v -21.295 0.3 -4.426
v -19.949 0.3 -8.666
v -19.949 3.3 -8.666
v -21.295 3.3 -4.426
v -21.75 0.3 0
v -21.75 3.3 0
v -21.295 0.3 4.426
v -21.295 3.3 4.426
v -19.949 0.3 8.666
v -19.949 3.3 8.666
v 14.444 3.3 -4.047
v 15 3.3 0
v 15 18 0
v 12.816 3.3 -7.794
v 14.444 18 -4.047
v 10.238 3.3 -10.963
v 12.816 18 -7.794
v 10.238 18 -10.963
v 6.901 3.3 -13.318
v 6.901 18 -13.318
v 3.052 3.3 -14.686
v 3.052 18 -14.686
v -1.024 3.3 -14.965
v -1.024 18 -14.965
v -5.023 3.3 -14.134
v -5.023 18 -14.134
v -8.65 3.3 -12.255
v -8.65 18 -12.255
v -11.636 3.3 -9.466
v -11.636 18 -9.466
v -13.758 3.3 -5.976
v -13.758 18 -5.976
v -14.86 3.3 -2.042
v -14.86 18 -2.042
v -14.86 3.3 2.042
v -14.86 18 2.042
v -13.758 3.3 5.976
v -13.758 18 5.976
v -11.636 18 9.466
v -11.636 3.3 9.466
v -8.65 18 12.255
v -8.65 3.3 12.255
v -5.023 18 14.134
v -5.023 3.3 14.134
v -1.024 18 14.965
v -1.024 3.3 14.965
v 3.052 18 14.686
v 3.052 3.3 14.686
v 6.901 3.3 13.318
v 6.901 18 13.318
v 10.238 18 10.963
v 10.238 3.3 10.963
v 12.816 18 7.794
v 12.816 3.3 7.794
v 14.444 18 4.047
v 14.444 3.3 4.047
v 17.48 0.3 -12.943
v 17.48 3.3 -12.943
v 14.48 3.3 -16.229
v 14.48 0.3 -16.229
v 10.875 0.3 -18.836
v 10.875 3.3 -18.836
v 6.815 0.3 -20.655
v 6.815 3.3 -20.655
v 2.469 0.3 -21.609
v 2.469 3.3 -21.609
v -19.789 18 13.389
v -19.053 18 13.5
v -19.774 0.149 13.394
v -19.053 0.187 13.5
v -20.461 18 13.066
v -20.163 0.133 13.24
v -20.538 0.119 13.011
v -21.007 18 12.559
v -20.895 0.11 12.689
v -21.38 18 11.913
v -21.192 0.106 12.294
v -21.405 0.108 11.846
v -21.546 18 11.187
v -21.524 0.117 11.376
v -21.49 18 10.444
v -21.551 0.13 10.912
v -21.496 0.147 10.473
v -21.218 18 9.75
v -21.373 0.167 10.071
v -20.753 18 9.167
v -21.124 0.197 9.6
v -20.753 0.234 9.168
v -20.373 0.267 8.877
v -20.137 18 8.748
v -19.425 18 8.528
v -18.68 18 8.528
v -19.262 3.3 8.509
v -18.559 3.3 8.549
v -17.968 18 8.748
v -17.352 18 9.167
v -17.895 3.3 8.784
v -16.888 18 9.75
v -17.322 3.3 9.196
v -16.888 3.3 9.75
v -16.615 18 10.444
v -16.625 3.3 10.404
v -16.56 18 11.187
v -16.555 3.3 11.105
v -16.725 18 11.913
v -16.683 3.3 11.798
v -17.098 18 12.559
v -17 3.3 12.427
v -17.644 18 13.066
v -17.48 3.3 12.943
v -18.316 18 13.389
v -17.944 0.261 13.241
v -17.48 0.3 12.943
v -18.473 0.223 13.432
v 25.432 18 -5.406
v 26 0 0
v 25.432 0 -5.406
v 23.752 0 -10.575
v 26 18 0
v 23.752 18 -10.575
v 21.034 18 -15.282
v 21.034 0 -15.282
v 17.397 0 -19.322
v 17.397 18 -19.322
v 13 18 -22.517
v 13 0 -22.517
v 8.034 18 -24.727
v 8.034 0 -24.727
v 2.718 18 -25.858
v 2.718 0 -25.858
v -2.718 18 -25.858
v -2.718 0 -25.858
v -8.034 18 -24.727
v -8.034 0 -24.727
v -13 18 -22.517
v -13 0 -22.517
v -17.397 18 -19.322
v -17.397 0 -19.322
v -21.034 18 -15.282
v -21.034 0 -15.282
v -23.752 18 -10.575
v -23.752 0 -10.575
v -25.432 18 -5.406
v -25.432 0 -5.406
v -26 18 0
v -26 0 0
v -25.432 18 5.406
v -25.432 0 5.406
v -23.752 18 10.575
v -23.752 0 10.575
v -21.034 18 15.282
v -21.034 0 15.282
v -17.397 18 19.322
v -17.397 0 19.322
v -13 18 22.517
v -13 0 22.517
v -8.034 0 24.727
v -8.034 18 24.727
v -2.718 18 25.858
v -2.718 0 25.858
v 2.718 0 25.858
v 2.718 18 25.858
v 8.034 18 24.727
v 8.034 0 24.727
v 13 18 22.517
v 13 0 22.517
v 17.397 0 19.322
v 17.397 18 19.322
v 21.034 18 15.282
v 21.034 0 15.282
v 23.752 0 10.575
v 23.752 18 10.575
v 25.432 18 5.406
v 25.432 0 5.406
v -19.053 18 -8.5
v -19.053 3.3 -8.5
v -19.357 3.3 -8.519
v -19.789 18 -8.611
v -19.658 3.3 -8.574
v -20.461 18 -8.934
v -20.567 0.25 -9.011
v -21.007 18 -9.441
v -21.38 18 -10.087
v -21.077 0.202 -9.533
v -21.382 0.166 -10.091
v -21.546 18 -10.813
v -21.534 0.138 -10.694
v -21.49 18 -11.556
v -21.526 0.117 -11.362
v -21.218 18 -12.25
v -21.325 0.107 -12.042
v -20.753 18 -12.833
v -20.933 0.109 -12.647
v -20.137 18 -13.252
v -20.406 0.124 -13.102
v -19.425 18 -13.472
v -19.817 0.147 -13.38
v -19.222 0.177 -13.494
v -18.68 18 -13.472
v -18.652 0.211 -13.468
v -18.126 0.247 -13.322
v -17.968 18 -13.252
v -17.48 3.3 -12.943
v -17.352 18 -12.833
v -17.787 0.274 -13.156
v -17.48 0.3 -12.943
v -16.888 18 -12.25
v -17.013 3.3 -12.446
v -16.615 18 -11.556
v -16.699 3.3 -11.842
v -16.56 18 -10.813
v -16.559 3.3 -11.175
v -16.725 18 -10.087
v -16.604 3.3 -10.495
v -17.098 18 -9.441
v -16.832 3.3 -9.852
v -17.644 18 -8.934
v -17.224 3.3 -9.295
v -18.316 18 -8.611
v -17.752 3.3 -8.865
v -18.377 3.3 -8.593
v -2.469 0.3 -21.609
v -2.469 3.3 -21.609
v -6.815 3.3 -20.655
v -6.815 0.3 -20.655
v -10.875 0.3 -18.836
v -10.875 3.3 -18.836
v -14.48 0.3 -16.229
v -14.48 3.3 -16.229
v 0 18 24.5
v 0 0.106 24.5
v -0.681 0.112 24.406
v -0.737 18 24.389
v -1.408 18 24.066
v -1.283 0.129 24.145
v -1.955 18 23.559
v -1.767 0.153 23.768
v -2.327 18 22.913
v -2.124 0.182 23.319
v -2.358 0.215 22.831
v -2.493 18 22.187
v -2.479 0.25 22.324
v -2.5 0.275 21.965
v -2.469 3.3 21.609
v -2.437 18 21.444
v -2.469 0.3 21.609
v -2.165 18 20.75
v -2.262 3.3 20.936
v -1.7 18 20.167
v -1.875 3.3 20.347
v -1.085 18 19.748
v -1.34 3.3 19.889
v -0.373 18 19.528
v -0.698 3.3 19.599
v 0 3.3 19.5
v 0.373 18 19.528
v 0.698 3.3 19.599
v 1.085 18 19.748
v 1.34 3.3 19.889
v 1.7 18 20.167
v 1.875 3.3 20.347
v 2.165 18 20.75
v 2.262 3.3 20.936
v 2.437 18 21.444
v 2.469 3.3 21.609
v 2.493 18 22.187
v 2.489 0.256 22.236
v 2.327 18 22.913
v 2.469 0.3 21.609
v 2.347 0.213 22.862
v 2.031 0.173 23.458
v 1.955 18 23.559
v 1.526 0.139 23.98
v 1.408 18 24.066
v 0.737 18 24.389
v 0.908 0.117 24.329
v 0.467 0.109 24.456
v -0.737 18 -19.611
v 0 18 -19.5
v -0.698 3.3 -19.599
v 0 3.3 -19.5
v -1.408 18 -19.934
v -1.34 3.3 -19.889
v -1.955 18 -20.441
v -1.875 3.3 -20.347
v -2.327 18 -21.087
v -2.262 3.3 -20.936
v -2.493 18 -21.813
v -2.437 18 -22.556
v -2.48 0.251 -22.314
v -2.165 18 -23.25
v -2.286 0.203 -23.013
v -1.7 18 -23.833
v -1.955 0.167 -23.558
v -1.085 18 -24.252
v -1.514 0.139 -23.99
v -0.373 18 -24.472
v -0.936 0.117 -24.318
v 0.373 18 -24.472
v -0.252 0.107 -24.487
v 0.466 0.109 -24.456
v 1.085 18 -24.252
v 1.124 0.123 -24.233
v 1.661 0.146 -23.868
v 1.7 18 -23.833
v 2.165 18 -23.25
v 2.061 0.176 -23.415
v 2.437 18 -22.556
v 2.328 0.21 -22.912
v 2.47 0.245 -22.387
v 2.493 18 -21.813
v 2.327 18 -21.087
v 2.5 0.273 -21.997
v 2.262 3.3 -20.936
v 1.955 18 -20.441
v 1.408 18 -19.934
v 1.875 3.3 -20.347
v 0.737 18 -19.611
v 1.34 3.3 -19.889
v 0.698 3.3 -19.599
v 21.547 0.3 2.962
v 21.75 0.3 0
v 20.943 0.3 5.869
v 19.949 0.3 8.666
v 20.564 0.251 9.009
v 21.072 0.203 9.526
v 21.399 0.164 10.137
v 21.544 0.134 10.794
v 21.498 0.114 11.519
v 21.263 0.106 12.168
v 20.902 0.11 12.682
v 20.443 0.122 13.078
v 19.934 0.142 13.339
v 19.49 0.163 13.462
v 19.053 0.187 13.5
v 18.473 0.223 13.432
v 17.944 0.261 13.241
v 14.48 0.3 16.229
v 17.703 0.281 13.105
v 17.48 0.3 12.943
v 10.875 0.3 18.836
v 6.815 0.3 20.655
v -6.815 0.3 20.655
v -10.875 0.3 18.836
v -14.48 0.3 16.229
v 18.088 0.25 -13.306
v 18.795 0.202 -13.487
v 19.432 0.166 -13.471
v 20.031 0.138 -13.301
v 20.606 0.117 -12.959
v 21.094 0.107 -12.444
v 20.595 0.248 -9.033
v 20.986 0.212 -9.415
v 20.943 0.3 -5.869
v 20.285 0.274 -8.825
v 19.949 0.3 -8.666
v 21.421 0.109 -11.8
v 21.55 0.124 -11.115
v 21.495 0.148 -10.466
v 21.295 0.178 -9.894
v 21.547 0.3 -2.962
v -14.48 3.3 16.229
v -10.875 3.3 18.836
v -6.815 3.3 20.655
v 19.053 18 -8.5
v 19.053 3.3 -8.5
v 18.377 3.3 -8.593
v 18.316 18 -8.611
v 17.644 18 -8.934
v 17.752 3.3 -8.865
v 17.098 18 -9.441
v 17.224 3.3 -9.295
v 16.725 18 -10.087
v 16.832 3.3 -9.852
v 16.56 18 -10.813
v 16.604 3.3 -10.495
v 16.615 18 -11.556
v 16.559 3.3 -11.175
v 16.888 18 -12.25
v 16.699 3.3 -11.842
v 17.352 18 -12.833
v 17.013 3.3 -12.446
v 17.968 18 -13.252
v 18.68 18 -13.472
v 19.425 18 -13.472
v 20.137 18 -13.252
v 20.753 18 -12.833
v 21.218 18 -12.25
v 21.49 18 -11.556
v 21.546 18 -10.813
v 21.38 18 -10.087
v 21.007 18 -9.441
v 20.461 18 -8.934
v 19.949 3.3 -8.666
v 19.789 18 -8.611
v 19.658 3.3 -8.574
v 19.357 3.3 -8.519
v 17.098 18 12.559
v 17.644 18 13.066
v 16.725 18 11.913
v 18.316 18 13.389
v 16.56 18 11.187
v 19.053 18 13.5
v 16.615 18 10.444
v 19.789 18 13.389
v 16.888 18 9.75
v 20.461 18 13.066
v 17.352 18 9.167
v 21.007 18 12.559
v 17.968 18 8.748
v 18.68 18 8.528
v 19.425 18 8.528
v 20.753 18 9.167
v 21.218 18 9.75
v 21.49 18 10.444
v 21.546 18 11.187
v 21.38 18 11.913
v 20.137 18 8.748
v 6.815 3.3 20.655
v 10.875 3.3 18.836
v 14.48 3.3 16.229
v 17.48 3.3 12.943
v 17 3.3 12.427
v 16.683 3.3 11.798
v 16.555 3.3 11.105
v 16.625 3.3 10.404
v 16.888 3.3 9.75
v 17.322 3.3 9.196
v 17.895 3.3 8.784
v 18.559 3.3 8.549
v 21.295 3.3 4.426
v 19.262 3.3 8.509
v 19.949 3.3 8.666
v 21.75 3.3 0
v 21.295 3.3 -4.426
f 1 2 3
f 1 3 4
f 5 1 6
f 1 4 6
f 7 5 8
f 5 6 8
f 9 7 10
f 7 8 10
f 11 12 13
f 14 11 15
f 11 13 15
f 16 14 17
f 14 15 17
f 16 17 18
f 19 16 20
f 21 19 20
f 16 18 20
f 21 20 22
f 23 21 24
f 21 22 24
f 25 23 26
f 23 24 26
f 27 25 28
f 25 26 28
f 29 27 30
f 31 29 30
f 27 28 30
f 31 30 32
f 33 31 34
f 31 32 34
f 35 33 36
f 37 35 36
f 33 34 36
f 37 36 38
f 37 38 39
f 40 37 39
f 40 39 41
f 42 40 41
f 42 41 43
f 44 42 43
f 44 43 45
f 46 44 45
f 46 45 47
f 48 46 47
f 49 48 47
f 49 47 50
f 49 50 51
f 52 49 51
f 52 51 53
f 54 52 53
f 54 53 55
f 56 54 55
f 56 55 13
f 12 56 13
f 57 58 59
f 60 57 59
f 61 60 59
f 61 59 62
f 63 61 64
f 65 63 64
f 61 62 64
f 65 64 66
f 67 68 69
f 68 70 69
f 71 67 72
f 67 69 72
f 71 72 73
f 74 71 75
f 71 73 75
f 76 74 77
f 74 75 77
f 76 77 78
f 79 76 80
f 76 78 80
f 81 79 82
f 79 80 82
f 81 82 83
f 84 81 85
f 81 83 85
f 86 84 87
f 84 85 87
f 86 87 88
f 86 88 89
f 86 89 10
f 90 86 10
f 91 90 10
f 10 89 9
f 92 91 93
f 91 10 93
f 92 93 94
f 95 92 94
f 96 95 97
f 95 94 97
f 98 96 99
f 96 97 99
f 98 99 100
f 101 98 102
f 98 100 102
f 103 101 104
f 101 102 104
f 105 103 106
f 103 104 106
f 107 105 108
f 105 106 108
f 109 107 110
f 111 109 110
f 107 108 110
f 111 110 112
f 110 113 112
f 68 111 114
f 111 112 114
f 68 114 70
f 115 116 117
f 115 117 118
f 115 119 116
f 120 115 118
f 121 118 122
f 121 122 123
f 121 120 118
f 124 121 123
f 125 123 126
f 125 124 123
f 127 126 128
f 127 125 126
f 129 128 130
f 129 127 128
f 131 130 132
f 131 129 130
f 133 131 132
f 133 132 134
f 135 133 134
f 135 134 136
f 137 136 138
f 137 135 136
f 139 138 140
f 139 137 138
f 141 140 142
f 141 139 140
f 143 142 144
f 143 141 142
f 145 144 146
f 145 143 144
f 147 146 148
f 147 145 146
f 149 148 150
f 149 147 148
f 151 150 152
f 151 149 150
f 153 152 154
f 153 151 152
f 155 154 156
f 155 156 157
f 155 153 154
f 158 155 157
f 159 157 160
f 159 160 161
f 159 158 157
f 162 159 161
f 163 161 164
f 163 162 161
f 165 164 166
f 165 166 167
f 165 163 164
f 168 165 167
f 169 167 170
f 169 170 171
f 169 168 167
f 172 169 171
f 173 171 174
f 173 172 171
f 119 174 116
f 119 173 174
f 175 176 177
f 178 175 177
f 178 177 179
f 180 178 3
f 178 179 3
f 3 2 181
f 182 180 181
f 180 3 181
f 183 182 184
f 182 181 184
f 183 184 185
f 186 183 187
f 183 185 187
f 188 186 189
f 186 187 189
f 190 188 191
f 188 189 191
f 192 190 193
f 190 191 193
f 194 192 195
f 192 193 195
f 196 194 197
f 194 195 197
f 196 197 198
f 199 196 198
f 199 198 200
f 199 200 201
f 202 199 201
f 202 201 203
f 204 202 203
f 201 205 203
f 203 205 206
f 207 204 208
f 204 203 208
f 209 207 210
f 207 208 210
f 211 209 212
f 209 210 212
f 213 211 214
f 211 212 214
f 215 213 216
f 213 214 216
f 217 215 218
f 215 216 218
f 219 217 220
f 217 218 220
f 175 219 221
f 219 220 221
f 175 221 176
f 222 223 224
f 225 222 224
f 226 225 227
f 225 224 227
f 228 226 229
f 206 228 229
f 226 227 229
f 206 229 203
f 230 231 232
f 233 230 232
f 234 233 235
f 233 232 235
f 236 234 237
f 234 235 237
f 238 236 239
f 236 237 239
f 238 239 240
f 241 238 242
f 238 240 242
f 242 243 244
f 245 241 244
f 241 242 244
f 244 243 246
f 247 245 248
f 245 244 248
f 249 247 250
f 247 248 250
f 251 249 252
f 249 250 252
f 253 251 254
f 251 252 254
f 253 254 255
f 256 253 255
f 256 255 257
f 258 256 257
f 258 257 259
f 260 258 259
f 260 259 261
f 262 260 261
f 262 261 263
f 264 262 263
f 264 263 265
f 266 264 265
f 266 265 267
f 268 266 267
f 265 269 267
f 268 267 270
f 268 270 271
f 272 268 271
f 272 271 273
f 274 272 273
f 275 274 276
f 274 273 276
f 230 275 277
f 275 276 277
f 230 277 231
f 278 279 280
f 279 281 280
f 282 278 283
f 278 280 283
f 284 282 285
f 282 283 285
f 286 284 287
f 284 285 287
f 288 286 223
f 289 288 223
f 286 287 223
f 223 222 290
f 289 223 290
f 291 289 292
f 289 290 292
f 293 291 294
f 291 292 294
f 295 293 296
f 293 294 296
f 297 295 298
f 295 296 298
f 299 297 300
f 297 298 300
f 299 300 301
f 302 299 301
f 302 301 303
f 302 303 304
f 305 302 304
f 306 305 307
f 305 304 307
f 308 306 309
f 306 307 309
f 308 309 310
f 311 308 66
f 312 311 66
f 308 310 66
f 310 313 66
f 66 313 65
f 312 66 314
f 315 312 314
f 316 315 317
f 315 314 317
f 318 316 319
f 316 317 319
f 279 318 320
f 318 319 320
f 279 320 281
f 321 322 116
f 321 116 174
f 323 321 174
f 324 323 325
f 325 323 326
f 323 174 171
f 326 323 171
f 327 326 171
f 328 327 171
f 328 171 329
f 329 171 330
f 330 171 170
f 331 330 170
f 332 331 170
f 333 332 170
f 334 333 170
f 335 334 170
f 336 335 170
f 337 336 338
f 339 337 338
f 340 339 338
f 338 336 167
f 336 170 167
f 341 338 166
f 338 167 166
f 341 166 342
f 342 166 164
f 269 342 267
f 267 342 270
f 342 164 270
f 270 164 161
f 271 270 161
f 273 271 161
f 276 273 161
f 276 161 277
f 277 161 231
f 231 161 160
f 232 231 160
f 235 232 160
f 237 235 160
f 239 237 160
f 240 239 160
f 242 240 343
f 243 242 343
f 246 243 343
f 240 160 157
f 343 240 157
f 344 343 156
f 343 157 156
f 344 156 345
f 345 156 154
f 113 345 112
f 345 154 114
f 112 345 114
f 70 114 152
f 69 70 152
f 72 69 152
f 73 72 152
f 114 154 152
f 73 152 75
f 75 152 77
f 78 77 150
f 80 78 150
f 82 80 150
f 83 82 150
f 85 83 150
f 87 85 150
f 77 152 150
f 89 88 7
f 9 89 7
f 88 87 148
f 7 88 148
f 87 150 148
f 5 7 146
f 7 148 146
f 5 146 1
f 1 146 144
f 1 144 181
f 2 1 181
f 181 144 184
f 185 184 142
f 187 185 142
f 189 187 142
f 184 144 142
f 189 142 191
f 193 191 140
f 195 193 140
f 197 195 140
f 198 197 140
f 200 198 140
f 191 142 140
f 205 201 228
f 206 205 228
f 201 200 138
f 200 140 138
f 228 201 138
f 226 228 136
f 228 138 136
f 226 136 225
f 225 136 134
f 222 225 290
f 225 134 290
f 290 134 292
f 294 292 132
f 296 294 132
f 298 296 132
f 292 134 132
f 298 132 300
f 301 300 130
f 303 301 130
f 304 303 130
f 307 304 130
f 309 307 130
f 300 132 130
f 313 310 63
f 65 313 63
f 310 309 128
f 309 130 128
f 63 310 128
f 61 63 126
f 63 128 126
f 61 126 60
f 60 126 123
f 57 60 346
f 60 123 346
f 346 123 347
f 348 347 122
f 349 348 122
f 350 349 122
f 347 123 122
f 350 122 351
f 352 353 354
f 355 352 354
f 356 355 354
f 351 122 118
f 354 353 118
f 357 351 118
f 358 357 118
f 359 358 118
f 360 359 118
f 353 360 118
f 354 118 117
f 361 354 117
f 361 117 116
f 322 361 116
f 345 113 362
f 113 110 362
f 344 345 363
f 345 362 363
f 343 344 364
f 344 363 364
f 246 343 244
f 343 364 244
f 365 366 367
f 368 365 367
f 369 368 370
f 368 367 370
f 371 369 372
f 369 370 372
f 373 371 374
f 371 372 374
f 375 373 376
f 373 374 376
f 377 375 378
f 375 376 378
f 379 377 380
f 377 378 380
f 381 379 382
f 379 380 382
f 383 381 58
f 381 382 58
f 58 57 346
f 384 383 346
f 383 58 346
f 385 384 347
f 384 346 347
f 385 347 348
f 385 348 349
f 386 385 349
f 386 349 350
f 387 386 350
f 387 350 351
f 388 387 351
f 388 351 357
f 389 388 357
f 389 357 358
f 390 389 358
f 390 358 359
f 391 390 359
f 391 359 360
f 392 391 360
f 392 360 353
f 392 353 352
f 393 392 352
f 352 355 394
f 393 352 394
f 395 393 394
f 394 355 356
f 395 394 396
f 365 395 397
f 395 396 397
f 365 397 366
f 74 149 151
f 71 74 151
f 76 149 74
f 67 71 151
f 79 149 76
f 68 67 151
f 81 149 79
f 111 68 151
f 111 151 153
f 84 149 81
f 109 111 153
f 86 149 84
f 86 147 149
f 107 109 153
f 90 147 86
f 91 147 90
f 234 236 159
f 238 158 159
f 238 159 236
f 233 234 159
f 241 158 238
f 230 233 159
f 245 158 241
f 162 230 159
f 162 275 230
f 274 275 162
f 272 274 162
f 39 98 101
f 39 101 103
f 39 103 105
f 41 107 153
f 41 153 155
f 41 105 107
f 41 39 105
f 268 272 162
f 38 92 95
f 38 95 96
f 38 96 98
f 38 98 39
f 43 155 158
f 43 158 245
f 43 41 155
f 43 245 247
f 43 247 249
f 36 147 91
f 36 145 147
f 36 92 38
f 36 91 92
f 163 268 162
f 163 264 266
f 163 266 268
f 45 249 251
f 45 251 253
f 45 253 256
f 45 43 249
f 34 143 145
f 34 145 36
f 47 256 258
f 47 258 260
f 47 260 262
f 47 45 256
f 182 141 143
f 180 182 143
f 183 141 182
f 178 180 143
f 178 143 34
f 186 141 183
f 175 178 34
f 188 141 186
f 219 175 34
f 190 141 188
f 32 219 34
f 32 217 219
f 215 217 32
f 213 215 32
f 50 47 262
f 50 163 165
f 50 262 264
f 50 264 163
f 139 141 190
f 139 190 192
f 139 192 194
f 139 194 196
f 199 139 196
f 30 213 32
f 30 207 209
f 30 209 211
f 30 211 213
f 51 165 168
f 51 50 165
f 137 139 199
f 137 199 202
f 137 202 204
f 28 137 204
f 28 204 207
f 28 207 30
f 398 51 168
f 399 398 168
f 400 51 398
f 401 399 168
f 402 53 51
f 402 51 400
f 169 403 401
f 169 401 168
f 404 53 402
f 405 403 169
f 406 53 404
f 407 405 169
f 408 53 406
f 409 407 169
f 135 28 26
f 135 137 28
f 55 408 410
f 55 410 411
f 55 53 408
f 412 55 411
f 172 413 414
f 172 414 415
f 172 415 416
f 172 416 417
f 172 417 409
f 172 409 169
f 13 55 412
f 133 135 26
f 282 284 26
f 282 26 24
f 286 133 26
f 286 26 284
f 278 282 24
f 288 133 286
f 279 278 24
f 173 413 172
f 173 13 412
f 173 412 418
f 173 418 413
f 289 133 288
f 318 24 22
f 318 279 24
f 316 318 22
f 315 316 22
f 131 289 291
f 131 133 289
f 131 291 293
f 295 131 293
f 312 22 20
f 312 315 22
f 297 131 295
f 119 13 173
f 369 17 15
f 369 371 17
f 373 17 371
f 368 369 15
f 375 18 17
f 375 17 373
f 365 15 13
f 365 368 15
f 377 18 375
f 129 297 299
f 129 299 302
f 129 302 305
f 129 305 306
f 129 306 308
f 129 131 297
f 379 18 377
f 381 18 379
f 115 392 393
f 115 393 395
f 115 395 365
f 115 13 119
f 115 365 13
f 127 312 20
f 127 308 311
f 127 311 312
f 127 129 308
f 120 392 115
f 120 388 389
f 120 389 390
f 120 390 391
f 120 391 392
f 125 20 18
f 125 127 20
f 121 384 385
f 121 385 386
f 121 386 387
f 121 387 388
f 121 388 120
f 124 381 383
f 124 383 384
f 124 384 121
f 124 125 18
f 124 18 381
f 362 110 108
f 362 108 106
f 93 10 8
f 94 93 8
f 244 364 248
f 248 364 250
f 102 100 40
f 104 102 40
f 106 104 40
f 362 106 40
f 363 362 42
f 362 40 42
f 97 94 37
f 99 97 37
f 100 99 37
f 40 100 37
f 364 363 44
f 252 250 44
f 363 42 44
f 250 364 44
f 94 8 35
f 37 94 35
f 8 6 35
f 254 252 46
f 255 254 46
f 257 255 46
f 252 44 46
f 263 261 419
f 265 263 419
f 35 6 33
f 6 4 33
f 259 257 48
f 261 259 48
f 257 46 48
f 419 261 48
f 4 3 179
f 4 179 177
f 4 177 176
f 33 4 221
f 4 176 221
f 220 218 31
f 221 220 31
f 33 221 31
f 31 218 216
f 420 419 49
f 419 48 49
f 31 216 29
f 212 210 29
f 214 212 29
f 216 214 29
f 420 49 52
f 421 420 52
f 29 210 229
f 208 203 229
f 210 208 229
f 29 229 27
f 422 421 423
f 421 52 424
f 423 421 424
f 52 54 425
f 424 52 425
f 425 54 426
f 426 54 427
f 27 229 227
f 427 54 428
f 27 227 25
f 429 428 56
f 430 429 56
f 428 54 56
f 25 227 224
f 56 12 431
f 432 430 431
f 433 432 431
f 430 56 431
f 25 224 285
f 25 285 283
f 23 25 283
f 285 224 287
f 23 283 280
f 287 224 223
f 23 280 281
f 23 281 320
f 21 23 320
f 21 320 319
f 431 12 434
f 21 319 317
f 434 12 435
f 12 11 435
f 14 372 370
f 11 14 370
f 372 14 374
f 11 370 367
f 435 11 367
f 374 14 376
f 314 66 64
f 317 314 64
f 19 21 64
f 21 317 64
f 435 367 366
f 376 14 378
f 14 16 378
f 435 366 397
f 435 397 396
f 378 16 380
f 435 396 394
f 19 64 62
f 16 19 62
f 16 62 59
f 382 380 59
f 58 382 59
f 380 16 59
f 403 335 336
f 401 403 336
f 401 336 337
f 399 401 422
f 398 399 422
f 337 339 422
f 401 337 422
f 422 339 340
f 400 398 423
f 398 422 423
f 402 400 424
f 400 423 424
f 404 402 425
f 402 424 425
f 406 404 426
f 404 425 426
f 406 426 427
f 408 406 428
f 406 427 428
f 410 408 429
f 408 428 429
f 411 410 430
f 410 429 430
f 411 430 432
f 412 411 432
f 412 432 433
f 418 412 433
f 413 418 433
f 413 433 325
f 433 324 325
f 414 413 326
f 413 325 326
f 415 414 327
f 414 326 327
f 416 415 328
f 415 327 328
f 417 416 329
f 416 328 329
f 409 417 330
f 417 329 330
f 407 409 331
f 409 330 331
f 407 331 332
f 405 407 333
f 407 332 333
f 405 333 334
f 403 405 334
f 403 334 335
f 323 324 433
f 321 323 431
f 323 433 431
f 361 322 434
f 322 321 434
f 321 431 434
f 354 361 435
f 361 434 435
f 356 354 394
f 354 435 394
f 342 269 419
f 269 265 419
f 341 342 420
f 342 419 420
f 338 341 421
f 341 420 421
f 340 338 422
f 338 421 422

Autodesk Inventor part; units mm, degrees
ref_plane "YZ Plane" through (0, 0, 0) normal (1, 0, 0) x (0, 1, 0)
ref_plane "XZ Plane" through (0, 0, 0) normal (0, 1, 0) x (-1, 0, 0)
ref_plane "XY Plane" through (0, 0, 0) normal (0, 0, 1) x (1, 0, 0)
sketch "Sketch3" plane through (0, 0, 0) normal (0, 0, 1) x (1, 0, 0)
  line L0 (26, 0) -> (21.75, 0.3)
  line L1 (26, 0) -> (26, 18)
  line L2 (21.75, 0.3) -> (21.75, 3.3)
  line L3 (21.75, 3.3) -> (15, 3.3)
  line L4 (15, 3.3) -> (15, 18)
  line L5 (15, 18) -> (26, 18)
  line L6 (0, -3.6) -> (0, 21.6) projected
  point P0 (0, 0)
  dimension "d5" = 26
  dimension "d6" = 21.75
  dimension "d7" = 0.3
  dimension "d8" = 18
  dimension "d9" = 15
  dimension "d10" = 3
revolve "Revolution1" add sketch "Sketch3" angle 360 about axis through (0, -10, 0) along (0, 1, 0)
sketch "Sketch4" plane through (0, 18, 0) normal (0, 1, 0) x (1, 0, 0)
  point P0 (0, 0)
  point P1 (0, 22)
  point P2 (-19.0526, 11)
  point P3 (-19.0526, -11)
  point P4 (0, -22)
  point P5 (19.0526, -11)
  point P6 (19.0526, 11)
  dimension "d12" = 22
  dimension "d15" = 360
hole "Hole1" at (0, 18, -22) at (-19.0526, 18, -11) at (-19.0526, 18, 11) at (0, 18, 22) at (19.0526, 18, 11) at (19.0526, 18, -11) direction (0, -1, 0) diameter 5 end through all both
properties part number "Adapter1"
